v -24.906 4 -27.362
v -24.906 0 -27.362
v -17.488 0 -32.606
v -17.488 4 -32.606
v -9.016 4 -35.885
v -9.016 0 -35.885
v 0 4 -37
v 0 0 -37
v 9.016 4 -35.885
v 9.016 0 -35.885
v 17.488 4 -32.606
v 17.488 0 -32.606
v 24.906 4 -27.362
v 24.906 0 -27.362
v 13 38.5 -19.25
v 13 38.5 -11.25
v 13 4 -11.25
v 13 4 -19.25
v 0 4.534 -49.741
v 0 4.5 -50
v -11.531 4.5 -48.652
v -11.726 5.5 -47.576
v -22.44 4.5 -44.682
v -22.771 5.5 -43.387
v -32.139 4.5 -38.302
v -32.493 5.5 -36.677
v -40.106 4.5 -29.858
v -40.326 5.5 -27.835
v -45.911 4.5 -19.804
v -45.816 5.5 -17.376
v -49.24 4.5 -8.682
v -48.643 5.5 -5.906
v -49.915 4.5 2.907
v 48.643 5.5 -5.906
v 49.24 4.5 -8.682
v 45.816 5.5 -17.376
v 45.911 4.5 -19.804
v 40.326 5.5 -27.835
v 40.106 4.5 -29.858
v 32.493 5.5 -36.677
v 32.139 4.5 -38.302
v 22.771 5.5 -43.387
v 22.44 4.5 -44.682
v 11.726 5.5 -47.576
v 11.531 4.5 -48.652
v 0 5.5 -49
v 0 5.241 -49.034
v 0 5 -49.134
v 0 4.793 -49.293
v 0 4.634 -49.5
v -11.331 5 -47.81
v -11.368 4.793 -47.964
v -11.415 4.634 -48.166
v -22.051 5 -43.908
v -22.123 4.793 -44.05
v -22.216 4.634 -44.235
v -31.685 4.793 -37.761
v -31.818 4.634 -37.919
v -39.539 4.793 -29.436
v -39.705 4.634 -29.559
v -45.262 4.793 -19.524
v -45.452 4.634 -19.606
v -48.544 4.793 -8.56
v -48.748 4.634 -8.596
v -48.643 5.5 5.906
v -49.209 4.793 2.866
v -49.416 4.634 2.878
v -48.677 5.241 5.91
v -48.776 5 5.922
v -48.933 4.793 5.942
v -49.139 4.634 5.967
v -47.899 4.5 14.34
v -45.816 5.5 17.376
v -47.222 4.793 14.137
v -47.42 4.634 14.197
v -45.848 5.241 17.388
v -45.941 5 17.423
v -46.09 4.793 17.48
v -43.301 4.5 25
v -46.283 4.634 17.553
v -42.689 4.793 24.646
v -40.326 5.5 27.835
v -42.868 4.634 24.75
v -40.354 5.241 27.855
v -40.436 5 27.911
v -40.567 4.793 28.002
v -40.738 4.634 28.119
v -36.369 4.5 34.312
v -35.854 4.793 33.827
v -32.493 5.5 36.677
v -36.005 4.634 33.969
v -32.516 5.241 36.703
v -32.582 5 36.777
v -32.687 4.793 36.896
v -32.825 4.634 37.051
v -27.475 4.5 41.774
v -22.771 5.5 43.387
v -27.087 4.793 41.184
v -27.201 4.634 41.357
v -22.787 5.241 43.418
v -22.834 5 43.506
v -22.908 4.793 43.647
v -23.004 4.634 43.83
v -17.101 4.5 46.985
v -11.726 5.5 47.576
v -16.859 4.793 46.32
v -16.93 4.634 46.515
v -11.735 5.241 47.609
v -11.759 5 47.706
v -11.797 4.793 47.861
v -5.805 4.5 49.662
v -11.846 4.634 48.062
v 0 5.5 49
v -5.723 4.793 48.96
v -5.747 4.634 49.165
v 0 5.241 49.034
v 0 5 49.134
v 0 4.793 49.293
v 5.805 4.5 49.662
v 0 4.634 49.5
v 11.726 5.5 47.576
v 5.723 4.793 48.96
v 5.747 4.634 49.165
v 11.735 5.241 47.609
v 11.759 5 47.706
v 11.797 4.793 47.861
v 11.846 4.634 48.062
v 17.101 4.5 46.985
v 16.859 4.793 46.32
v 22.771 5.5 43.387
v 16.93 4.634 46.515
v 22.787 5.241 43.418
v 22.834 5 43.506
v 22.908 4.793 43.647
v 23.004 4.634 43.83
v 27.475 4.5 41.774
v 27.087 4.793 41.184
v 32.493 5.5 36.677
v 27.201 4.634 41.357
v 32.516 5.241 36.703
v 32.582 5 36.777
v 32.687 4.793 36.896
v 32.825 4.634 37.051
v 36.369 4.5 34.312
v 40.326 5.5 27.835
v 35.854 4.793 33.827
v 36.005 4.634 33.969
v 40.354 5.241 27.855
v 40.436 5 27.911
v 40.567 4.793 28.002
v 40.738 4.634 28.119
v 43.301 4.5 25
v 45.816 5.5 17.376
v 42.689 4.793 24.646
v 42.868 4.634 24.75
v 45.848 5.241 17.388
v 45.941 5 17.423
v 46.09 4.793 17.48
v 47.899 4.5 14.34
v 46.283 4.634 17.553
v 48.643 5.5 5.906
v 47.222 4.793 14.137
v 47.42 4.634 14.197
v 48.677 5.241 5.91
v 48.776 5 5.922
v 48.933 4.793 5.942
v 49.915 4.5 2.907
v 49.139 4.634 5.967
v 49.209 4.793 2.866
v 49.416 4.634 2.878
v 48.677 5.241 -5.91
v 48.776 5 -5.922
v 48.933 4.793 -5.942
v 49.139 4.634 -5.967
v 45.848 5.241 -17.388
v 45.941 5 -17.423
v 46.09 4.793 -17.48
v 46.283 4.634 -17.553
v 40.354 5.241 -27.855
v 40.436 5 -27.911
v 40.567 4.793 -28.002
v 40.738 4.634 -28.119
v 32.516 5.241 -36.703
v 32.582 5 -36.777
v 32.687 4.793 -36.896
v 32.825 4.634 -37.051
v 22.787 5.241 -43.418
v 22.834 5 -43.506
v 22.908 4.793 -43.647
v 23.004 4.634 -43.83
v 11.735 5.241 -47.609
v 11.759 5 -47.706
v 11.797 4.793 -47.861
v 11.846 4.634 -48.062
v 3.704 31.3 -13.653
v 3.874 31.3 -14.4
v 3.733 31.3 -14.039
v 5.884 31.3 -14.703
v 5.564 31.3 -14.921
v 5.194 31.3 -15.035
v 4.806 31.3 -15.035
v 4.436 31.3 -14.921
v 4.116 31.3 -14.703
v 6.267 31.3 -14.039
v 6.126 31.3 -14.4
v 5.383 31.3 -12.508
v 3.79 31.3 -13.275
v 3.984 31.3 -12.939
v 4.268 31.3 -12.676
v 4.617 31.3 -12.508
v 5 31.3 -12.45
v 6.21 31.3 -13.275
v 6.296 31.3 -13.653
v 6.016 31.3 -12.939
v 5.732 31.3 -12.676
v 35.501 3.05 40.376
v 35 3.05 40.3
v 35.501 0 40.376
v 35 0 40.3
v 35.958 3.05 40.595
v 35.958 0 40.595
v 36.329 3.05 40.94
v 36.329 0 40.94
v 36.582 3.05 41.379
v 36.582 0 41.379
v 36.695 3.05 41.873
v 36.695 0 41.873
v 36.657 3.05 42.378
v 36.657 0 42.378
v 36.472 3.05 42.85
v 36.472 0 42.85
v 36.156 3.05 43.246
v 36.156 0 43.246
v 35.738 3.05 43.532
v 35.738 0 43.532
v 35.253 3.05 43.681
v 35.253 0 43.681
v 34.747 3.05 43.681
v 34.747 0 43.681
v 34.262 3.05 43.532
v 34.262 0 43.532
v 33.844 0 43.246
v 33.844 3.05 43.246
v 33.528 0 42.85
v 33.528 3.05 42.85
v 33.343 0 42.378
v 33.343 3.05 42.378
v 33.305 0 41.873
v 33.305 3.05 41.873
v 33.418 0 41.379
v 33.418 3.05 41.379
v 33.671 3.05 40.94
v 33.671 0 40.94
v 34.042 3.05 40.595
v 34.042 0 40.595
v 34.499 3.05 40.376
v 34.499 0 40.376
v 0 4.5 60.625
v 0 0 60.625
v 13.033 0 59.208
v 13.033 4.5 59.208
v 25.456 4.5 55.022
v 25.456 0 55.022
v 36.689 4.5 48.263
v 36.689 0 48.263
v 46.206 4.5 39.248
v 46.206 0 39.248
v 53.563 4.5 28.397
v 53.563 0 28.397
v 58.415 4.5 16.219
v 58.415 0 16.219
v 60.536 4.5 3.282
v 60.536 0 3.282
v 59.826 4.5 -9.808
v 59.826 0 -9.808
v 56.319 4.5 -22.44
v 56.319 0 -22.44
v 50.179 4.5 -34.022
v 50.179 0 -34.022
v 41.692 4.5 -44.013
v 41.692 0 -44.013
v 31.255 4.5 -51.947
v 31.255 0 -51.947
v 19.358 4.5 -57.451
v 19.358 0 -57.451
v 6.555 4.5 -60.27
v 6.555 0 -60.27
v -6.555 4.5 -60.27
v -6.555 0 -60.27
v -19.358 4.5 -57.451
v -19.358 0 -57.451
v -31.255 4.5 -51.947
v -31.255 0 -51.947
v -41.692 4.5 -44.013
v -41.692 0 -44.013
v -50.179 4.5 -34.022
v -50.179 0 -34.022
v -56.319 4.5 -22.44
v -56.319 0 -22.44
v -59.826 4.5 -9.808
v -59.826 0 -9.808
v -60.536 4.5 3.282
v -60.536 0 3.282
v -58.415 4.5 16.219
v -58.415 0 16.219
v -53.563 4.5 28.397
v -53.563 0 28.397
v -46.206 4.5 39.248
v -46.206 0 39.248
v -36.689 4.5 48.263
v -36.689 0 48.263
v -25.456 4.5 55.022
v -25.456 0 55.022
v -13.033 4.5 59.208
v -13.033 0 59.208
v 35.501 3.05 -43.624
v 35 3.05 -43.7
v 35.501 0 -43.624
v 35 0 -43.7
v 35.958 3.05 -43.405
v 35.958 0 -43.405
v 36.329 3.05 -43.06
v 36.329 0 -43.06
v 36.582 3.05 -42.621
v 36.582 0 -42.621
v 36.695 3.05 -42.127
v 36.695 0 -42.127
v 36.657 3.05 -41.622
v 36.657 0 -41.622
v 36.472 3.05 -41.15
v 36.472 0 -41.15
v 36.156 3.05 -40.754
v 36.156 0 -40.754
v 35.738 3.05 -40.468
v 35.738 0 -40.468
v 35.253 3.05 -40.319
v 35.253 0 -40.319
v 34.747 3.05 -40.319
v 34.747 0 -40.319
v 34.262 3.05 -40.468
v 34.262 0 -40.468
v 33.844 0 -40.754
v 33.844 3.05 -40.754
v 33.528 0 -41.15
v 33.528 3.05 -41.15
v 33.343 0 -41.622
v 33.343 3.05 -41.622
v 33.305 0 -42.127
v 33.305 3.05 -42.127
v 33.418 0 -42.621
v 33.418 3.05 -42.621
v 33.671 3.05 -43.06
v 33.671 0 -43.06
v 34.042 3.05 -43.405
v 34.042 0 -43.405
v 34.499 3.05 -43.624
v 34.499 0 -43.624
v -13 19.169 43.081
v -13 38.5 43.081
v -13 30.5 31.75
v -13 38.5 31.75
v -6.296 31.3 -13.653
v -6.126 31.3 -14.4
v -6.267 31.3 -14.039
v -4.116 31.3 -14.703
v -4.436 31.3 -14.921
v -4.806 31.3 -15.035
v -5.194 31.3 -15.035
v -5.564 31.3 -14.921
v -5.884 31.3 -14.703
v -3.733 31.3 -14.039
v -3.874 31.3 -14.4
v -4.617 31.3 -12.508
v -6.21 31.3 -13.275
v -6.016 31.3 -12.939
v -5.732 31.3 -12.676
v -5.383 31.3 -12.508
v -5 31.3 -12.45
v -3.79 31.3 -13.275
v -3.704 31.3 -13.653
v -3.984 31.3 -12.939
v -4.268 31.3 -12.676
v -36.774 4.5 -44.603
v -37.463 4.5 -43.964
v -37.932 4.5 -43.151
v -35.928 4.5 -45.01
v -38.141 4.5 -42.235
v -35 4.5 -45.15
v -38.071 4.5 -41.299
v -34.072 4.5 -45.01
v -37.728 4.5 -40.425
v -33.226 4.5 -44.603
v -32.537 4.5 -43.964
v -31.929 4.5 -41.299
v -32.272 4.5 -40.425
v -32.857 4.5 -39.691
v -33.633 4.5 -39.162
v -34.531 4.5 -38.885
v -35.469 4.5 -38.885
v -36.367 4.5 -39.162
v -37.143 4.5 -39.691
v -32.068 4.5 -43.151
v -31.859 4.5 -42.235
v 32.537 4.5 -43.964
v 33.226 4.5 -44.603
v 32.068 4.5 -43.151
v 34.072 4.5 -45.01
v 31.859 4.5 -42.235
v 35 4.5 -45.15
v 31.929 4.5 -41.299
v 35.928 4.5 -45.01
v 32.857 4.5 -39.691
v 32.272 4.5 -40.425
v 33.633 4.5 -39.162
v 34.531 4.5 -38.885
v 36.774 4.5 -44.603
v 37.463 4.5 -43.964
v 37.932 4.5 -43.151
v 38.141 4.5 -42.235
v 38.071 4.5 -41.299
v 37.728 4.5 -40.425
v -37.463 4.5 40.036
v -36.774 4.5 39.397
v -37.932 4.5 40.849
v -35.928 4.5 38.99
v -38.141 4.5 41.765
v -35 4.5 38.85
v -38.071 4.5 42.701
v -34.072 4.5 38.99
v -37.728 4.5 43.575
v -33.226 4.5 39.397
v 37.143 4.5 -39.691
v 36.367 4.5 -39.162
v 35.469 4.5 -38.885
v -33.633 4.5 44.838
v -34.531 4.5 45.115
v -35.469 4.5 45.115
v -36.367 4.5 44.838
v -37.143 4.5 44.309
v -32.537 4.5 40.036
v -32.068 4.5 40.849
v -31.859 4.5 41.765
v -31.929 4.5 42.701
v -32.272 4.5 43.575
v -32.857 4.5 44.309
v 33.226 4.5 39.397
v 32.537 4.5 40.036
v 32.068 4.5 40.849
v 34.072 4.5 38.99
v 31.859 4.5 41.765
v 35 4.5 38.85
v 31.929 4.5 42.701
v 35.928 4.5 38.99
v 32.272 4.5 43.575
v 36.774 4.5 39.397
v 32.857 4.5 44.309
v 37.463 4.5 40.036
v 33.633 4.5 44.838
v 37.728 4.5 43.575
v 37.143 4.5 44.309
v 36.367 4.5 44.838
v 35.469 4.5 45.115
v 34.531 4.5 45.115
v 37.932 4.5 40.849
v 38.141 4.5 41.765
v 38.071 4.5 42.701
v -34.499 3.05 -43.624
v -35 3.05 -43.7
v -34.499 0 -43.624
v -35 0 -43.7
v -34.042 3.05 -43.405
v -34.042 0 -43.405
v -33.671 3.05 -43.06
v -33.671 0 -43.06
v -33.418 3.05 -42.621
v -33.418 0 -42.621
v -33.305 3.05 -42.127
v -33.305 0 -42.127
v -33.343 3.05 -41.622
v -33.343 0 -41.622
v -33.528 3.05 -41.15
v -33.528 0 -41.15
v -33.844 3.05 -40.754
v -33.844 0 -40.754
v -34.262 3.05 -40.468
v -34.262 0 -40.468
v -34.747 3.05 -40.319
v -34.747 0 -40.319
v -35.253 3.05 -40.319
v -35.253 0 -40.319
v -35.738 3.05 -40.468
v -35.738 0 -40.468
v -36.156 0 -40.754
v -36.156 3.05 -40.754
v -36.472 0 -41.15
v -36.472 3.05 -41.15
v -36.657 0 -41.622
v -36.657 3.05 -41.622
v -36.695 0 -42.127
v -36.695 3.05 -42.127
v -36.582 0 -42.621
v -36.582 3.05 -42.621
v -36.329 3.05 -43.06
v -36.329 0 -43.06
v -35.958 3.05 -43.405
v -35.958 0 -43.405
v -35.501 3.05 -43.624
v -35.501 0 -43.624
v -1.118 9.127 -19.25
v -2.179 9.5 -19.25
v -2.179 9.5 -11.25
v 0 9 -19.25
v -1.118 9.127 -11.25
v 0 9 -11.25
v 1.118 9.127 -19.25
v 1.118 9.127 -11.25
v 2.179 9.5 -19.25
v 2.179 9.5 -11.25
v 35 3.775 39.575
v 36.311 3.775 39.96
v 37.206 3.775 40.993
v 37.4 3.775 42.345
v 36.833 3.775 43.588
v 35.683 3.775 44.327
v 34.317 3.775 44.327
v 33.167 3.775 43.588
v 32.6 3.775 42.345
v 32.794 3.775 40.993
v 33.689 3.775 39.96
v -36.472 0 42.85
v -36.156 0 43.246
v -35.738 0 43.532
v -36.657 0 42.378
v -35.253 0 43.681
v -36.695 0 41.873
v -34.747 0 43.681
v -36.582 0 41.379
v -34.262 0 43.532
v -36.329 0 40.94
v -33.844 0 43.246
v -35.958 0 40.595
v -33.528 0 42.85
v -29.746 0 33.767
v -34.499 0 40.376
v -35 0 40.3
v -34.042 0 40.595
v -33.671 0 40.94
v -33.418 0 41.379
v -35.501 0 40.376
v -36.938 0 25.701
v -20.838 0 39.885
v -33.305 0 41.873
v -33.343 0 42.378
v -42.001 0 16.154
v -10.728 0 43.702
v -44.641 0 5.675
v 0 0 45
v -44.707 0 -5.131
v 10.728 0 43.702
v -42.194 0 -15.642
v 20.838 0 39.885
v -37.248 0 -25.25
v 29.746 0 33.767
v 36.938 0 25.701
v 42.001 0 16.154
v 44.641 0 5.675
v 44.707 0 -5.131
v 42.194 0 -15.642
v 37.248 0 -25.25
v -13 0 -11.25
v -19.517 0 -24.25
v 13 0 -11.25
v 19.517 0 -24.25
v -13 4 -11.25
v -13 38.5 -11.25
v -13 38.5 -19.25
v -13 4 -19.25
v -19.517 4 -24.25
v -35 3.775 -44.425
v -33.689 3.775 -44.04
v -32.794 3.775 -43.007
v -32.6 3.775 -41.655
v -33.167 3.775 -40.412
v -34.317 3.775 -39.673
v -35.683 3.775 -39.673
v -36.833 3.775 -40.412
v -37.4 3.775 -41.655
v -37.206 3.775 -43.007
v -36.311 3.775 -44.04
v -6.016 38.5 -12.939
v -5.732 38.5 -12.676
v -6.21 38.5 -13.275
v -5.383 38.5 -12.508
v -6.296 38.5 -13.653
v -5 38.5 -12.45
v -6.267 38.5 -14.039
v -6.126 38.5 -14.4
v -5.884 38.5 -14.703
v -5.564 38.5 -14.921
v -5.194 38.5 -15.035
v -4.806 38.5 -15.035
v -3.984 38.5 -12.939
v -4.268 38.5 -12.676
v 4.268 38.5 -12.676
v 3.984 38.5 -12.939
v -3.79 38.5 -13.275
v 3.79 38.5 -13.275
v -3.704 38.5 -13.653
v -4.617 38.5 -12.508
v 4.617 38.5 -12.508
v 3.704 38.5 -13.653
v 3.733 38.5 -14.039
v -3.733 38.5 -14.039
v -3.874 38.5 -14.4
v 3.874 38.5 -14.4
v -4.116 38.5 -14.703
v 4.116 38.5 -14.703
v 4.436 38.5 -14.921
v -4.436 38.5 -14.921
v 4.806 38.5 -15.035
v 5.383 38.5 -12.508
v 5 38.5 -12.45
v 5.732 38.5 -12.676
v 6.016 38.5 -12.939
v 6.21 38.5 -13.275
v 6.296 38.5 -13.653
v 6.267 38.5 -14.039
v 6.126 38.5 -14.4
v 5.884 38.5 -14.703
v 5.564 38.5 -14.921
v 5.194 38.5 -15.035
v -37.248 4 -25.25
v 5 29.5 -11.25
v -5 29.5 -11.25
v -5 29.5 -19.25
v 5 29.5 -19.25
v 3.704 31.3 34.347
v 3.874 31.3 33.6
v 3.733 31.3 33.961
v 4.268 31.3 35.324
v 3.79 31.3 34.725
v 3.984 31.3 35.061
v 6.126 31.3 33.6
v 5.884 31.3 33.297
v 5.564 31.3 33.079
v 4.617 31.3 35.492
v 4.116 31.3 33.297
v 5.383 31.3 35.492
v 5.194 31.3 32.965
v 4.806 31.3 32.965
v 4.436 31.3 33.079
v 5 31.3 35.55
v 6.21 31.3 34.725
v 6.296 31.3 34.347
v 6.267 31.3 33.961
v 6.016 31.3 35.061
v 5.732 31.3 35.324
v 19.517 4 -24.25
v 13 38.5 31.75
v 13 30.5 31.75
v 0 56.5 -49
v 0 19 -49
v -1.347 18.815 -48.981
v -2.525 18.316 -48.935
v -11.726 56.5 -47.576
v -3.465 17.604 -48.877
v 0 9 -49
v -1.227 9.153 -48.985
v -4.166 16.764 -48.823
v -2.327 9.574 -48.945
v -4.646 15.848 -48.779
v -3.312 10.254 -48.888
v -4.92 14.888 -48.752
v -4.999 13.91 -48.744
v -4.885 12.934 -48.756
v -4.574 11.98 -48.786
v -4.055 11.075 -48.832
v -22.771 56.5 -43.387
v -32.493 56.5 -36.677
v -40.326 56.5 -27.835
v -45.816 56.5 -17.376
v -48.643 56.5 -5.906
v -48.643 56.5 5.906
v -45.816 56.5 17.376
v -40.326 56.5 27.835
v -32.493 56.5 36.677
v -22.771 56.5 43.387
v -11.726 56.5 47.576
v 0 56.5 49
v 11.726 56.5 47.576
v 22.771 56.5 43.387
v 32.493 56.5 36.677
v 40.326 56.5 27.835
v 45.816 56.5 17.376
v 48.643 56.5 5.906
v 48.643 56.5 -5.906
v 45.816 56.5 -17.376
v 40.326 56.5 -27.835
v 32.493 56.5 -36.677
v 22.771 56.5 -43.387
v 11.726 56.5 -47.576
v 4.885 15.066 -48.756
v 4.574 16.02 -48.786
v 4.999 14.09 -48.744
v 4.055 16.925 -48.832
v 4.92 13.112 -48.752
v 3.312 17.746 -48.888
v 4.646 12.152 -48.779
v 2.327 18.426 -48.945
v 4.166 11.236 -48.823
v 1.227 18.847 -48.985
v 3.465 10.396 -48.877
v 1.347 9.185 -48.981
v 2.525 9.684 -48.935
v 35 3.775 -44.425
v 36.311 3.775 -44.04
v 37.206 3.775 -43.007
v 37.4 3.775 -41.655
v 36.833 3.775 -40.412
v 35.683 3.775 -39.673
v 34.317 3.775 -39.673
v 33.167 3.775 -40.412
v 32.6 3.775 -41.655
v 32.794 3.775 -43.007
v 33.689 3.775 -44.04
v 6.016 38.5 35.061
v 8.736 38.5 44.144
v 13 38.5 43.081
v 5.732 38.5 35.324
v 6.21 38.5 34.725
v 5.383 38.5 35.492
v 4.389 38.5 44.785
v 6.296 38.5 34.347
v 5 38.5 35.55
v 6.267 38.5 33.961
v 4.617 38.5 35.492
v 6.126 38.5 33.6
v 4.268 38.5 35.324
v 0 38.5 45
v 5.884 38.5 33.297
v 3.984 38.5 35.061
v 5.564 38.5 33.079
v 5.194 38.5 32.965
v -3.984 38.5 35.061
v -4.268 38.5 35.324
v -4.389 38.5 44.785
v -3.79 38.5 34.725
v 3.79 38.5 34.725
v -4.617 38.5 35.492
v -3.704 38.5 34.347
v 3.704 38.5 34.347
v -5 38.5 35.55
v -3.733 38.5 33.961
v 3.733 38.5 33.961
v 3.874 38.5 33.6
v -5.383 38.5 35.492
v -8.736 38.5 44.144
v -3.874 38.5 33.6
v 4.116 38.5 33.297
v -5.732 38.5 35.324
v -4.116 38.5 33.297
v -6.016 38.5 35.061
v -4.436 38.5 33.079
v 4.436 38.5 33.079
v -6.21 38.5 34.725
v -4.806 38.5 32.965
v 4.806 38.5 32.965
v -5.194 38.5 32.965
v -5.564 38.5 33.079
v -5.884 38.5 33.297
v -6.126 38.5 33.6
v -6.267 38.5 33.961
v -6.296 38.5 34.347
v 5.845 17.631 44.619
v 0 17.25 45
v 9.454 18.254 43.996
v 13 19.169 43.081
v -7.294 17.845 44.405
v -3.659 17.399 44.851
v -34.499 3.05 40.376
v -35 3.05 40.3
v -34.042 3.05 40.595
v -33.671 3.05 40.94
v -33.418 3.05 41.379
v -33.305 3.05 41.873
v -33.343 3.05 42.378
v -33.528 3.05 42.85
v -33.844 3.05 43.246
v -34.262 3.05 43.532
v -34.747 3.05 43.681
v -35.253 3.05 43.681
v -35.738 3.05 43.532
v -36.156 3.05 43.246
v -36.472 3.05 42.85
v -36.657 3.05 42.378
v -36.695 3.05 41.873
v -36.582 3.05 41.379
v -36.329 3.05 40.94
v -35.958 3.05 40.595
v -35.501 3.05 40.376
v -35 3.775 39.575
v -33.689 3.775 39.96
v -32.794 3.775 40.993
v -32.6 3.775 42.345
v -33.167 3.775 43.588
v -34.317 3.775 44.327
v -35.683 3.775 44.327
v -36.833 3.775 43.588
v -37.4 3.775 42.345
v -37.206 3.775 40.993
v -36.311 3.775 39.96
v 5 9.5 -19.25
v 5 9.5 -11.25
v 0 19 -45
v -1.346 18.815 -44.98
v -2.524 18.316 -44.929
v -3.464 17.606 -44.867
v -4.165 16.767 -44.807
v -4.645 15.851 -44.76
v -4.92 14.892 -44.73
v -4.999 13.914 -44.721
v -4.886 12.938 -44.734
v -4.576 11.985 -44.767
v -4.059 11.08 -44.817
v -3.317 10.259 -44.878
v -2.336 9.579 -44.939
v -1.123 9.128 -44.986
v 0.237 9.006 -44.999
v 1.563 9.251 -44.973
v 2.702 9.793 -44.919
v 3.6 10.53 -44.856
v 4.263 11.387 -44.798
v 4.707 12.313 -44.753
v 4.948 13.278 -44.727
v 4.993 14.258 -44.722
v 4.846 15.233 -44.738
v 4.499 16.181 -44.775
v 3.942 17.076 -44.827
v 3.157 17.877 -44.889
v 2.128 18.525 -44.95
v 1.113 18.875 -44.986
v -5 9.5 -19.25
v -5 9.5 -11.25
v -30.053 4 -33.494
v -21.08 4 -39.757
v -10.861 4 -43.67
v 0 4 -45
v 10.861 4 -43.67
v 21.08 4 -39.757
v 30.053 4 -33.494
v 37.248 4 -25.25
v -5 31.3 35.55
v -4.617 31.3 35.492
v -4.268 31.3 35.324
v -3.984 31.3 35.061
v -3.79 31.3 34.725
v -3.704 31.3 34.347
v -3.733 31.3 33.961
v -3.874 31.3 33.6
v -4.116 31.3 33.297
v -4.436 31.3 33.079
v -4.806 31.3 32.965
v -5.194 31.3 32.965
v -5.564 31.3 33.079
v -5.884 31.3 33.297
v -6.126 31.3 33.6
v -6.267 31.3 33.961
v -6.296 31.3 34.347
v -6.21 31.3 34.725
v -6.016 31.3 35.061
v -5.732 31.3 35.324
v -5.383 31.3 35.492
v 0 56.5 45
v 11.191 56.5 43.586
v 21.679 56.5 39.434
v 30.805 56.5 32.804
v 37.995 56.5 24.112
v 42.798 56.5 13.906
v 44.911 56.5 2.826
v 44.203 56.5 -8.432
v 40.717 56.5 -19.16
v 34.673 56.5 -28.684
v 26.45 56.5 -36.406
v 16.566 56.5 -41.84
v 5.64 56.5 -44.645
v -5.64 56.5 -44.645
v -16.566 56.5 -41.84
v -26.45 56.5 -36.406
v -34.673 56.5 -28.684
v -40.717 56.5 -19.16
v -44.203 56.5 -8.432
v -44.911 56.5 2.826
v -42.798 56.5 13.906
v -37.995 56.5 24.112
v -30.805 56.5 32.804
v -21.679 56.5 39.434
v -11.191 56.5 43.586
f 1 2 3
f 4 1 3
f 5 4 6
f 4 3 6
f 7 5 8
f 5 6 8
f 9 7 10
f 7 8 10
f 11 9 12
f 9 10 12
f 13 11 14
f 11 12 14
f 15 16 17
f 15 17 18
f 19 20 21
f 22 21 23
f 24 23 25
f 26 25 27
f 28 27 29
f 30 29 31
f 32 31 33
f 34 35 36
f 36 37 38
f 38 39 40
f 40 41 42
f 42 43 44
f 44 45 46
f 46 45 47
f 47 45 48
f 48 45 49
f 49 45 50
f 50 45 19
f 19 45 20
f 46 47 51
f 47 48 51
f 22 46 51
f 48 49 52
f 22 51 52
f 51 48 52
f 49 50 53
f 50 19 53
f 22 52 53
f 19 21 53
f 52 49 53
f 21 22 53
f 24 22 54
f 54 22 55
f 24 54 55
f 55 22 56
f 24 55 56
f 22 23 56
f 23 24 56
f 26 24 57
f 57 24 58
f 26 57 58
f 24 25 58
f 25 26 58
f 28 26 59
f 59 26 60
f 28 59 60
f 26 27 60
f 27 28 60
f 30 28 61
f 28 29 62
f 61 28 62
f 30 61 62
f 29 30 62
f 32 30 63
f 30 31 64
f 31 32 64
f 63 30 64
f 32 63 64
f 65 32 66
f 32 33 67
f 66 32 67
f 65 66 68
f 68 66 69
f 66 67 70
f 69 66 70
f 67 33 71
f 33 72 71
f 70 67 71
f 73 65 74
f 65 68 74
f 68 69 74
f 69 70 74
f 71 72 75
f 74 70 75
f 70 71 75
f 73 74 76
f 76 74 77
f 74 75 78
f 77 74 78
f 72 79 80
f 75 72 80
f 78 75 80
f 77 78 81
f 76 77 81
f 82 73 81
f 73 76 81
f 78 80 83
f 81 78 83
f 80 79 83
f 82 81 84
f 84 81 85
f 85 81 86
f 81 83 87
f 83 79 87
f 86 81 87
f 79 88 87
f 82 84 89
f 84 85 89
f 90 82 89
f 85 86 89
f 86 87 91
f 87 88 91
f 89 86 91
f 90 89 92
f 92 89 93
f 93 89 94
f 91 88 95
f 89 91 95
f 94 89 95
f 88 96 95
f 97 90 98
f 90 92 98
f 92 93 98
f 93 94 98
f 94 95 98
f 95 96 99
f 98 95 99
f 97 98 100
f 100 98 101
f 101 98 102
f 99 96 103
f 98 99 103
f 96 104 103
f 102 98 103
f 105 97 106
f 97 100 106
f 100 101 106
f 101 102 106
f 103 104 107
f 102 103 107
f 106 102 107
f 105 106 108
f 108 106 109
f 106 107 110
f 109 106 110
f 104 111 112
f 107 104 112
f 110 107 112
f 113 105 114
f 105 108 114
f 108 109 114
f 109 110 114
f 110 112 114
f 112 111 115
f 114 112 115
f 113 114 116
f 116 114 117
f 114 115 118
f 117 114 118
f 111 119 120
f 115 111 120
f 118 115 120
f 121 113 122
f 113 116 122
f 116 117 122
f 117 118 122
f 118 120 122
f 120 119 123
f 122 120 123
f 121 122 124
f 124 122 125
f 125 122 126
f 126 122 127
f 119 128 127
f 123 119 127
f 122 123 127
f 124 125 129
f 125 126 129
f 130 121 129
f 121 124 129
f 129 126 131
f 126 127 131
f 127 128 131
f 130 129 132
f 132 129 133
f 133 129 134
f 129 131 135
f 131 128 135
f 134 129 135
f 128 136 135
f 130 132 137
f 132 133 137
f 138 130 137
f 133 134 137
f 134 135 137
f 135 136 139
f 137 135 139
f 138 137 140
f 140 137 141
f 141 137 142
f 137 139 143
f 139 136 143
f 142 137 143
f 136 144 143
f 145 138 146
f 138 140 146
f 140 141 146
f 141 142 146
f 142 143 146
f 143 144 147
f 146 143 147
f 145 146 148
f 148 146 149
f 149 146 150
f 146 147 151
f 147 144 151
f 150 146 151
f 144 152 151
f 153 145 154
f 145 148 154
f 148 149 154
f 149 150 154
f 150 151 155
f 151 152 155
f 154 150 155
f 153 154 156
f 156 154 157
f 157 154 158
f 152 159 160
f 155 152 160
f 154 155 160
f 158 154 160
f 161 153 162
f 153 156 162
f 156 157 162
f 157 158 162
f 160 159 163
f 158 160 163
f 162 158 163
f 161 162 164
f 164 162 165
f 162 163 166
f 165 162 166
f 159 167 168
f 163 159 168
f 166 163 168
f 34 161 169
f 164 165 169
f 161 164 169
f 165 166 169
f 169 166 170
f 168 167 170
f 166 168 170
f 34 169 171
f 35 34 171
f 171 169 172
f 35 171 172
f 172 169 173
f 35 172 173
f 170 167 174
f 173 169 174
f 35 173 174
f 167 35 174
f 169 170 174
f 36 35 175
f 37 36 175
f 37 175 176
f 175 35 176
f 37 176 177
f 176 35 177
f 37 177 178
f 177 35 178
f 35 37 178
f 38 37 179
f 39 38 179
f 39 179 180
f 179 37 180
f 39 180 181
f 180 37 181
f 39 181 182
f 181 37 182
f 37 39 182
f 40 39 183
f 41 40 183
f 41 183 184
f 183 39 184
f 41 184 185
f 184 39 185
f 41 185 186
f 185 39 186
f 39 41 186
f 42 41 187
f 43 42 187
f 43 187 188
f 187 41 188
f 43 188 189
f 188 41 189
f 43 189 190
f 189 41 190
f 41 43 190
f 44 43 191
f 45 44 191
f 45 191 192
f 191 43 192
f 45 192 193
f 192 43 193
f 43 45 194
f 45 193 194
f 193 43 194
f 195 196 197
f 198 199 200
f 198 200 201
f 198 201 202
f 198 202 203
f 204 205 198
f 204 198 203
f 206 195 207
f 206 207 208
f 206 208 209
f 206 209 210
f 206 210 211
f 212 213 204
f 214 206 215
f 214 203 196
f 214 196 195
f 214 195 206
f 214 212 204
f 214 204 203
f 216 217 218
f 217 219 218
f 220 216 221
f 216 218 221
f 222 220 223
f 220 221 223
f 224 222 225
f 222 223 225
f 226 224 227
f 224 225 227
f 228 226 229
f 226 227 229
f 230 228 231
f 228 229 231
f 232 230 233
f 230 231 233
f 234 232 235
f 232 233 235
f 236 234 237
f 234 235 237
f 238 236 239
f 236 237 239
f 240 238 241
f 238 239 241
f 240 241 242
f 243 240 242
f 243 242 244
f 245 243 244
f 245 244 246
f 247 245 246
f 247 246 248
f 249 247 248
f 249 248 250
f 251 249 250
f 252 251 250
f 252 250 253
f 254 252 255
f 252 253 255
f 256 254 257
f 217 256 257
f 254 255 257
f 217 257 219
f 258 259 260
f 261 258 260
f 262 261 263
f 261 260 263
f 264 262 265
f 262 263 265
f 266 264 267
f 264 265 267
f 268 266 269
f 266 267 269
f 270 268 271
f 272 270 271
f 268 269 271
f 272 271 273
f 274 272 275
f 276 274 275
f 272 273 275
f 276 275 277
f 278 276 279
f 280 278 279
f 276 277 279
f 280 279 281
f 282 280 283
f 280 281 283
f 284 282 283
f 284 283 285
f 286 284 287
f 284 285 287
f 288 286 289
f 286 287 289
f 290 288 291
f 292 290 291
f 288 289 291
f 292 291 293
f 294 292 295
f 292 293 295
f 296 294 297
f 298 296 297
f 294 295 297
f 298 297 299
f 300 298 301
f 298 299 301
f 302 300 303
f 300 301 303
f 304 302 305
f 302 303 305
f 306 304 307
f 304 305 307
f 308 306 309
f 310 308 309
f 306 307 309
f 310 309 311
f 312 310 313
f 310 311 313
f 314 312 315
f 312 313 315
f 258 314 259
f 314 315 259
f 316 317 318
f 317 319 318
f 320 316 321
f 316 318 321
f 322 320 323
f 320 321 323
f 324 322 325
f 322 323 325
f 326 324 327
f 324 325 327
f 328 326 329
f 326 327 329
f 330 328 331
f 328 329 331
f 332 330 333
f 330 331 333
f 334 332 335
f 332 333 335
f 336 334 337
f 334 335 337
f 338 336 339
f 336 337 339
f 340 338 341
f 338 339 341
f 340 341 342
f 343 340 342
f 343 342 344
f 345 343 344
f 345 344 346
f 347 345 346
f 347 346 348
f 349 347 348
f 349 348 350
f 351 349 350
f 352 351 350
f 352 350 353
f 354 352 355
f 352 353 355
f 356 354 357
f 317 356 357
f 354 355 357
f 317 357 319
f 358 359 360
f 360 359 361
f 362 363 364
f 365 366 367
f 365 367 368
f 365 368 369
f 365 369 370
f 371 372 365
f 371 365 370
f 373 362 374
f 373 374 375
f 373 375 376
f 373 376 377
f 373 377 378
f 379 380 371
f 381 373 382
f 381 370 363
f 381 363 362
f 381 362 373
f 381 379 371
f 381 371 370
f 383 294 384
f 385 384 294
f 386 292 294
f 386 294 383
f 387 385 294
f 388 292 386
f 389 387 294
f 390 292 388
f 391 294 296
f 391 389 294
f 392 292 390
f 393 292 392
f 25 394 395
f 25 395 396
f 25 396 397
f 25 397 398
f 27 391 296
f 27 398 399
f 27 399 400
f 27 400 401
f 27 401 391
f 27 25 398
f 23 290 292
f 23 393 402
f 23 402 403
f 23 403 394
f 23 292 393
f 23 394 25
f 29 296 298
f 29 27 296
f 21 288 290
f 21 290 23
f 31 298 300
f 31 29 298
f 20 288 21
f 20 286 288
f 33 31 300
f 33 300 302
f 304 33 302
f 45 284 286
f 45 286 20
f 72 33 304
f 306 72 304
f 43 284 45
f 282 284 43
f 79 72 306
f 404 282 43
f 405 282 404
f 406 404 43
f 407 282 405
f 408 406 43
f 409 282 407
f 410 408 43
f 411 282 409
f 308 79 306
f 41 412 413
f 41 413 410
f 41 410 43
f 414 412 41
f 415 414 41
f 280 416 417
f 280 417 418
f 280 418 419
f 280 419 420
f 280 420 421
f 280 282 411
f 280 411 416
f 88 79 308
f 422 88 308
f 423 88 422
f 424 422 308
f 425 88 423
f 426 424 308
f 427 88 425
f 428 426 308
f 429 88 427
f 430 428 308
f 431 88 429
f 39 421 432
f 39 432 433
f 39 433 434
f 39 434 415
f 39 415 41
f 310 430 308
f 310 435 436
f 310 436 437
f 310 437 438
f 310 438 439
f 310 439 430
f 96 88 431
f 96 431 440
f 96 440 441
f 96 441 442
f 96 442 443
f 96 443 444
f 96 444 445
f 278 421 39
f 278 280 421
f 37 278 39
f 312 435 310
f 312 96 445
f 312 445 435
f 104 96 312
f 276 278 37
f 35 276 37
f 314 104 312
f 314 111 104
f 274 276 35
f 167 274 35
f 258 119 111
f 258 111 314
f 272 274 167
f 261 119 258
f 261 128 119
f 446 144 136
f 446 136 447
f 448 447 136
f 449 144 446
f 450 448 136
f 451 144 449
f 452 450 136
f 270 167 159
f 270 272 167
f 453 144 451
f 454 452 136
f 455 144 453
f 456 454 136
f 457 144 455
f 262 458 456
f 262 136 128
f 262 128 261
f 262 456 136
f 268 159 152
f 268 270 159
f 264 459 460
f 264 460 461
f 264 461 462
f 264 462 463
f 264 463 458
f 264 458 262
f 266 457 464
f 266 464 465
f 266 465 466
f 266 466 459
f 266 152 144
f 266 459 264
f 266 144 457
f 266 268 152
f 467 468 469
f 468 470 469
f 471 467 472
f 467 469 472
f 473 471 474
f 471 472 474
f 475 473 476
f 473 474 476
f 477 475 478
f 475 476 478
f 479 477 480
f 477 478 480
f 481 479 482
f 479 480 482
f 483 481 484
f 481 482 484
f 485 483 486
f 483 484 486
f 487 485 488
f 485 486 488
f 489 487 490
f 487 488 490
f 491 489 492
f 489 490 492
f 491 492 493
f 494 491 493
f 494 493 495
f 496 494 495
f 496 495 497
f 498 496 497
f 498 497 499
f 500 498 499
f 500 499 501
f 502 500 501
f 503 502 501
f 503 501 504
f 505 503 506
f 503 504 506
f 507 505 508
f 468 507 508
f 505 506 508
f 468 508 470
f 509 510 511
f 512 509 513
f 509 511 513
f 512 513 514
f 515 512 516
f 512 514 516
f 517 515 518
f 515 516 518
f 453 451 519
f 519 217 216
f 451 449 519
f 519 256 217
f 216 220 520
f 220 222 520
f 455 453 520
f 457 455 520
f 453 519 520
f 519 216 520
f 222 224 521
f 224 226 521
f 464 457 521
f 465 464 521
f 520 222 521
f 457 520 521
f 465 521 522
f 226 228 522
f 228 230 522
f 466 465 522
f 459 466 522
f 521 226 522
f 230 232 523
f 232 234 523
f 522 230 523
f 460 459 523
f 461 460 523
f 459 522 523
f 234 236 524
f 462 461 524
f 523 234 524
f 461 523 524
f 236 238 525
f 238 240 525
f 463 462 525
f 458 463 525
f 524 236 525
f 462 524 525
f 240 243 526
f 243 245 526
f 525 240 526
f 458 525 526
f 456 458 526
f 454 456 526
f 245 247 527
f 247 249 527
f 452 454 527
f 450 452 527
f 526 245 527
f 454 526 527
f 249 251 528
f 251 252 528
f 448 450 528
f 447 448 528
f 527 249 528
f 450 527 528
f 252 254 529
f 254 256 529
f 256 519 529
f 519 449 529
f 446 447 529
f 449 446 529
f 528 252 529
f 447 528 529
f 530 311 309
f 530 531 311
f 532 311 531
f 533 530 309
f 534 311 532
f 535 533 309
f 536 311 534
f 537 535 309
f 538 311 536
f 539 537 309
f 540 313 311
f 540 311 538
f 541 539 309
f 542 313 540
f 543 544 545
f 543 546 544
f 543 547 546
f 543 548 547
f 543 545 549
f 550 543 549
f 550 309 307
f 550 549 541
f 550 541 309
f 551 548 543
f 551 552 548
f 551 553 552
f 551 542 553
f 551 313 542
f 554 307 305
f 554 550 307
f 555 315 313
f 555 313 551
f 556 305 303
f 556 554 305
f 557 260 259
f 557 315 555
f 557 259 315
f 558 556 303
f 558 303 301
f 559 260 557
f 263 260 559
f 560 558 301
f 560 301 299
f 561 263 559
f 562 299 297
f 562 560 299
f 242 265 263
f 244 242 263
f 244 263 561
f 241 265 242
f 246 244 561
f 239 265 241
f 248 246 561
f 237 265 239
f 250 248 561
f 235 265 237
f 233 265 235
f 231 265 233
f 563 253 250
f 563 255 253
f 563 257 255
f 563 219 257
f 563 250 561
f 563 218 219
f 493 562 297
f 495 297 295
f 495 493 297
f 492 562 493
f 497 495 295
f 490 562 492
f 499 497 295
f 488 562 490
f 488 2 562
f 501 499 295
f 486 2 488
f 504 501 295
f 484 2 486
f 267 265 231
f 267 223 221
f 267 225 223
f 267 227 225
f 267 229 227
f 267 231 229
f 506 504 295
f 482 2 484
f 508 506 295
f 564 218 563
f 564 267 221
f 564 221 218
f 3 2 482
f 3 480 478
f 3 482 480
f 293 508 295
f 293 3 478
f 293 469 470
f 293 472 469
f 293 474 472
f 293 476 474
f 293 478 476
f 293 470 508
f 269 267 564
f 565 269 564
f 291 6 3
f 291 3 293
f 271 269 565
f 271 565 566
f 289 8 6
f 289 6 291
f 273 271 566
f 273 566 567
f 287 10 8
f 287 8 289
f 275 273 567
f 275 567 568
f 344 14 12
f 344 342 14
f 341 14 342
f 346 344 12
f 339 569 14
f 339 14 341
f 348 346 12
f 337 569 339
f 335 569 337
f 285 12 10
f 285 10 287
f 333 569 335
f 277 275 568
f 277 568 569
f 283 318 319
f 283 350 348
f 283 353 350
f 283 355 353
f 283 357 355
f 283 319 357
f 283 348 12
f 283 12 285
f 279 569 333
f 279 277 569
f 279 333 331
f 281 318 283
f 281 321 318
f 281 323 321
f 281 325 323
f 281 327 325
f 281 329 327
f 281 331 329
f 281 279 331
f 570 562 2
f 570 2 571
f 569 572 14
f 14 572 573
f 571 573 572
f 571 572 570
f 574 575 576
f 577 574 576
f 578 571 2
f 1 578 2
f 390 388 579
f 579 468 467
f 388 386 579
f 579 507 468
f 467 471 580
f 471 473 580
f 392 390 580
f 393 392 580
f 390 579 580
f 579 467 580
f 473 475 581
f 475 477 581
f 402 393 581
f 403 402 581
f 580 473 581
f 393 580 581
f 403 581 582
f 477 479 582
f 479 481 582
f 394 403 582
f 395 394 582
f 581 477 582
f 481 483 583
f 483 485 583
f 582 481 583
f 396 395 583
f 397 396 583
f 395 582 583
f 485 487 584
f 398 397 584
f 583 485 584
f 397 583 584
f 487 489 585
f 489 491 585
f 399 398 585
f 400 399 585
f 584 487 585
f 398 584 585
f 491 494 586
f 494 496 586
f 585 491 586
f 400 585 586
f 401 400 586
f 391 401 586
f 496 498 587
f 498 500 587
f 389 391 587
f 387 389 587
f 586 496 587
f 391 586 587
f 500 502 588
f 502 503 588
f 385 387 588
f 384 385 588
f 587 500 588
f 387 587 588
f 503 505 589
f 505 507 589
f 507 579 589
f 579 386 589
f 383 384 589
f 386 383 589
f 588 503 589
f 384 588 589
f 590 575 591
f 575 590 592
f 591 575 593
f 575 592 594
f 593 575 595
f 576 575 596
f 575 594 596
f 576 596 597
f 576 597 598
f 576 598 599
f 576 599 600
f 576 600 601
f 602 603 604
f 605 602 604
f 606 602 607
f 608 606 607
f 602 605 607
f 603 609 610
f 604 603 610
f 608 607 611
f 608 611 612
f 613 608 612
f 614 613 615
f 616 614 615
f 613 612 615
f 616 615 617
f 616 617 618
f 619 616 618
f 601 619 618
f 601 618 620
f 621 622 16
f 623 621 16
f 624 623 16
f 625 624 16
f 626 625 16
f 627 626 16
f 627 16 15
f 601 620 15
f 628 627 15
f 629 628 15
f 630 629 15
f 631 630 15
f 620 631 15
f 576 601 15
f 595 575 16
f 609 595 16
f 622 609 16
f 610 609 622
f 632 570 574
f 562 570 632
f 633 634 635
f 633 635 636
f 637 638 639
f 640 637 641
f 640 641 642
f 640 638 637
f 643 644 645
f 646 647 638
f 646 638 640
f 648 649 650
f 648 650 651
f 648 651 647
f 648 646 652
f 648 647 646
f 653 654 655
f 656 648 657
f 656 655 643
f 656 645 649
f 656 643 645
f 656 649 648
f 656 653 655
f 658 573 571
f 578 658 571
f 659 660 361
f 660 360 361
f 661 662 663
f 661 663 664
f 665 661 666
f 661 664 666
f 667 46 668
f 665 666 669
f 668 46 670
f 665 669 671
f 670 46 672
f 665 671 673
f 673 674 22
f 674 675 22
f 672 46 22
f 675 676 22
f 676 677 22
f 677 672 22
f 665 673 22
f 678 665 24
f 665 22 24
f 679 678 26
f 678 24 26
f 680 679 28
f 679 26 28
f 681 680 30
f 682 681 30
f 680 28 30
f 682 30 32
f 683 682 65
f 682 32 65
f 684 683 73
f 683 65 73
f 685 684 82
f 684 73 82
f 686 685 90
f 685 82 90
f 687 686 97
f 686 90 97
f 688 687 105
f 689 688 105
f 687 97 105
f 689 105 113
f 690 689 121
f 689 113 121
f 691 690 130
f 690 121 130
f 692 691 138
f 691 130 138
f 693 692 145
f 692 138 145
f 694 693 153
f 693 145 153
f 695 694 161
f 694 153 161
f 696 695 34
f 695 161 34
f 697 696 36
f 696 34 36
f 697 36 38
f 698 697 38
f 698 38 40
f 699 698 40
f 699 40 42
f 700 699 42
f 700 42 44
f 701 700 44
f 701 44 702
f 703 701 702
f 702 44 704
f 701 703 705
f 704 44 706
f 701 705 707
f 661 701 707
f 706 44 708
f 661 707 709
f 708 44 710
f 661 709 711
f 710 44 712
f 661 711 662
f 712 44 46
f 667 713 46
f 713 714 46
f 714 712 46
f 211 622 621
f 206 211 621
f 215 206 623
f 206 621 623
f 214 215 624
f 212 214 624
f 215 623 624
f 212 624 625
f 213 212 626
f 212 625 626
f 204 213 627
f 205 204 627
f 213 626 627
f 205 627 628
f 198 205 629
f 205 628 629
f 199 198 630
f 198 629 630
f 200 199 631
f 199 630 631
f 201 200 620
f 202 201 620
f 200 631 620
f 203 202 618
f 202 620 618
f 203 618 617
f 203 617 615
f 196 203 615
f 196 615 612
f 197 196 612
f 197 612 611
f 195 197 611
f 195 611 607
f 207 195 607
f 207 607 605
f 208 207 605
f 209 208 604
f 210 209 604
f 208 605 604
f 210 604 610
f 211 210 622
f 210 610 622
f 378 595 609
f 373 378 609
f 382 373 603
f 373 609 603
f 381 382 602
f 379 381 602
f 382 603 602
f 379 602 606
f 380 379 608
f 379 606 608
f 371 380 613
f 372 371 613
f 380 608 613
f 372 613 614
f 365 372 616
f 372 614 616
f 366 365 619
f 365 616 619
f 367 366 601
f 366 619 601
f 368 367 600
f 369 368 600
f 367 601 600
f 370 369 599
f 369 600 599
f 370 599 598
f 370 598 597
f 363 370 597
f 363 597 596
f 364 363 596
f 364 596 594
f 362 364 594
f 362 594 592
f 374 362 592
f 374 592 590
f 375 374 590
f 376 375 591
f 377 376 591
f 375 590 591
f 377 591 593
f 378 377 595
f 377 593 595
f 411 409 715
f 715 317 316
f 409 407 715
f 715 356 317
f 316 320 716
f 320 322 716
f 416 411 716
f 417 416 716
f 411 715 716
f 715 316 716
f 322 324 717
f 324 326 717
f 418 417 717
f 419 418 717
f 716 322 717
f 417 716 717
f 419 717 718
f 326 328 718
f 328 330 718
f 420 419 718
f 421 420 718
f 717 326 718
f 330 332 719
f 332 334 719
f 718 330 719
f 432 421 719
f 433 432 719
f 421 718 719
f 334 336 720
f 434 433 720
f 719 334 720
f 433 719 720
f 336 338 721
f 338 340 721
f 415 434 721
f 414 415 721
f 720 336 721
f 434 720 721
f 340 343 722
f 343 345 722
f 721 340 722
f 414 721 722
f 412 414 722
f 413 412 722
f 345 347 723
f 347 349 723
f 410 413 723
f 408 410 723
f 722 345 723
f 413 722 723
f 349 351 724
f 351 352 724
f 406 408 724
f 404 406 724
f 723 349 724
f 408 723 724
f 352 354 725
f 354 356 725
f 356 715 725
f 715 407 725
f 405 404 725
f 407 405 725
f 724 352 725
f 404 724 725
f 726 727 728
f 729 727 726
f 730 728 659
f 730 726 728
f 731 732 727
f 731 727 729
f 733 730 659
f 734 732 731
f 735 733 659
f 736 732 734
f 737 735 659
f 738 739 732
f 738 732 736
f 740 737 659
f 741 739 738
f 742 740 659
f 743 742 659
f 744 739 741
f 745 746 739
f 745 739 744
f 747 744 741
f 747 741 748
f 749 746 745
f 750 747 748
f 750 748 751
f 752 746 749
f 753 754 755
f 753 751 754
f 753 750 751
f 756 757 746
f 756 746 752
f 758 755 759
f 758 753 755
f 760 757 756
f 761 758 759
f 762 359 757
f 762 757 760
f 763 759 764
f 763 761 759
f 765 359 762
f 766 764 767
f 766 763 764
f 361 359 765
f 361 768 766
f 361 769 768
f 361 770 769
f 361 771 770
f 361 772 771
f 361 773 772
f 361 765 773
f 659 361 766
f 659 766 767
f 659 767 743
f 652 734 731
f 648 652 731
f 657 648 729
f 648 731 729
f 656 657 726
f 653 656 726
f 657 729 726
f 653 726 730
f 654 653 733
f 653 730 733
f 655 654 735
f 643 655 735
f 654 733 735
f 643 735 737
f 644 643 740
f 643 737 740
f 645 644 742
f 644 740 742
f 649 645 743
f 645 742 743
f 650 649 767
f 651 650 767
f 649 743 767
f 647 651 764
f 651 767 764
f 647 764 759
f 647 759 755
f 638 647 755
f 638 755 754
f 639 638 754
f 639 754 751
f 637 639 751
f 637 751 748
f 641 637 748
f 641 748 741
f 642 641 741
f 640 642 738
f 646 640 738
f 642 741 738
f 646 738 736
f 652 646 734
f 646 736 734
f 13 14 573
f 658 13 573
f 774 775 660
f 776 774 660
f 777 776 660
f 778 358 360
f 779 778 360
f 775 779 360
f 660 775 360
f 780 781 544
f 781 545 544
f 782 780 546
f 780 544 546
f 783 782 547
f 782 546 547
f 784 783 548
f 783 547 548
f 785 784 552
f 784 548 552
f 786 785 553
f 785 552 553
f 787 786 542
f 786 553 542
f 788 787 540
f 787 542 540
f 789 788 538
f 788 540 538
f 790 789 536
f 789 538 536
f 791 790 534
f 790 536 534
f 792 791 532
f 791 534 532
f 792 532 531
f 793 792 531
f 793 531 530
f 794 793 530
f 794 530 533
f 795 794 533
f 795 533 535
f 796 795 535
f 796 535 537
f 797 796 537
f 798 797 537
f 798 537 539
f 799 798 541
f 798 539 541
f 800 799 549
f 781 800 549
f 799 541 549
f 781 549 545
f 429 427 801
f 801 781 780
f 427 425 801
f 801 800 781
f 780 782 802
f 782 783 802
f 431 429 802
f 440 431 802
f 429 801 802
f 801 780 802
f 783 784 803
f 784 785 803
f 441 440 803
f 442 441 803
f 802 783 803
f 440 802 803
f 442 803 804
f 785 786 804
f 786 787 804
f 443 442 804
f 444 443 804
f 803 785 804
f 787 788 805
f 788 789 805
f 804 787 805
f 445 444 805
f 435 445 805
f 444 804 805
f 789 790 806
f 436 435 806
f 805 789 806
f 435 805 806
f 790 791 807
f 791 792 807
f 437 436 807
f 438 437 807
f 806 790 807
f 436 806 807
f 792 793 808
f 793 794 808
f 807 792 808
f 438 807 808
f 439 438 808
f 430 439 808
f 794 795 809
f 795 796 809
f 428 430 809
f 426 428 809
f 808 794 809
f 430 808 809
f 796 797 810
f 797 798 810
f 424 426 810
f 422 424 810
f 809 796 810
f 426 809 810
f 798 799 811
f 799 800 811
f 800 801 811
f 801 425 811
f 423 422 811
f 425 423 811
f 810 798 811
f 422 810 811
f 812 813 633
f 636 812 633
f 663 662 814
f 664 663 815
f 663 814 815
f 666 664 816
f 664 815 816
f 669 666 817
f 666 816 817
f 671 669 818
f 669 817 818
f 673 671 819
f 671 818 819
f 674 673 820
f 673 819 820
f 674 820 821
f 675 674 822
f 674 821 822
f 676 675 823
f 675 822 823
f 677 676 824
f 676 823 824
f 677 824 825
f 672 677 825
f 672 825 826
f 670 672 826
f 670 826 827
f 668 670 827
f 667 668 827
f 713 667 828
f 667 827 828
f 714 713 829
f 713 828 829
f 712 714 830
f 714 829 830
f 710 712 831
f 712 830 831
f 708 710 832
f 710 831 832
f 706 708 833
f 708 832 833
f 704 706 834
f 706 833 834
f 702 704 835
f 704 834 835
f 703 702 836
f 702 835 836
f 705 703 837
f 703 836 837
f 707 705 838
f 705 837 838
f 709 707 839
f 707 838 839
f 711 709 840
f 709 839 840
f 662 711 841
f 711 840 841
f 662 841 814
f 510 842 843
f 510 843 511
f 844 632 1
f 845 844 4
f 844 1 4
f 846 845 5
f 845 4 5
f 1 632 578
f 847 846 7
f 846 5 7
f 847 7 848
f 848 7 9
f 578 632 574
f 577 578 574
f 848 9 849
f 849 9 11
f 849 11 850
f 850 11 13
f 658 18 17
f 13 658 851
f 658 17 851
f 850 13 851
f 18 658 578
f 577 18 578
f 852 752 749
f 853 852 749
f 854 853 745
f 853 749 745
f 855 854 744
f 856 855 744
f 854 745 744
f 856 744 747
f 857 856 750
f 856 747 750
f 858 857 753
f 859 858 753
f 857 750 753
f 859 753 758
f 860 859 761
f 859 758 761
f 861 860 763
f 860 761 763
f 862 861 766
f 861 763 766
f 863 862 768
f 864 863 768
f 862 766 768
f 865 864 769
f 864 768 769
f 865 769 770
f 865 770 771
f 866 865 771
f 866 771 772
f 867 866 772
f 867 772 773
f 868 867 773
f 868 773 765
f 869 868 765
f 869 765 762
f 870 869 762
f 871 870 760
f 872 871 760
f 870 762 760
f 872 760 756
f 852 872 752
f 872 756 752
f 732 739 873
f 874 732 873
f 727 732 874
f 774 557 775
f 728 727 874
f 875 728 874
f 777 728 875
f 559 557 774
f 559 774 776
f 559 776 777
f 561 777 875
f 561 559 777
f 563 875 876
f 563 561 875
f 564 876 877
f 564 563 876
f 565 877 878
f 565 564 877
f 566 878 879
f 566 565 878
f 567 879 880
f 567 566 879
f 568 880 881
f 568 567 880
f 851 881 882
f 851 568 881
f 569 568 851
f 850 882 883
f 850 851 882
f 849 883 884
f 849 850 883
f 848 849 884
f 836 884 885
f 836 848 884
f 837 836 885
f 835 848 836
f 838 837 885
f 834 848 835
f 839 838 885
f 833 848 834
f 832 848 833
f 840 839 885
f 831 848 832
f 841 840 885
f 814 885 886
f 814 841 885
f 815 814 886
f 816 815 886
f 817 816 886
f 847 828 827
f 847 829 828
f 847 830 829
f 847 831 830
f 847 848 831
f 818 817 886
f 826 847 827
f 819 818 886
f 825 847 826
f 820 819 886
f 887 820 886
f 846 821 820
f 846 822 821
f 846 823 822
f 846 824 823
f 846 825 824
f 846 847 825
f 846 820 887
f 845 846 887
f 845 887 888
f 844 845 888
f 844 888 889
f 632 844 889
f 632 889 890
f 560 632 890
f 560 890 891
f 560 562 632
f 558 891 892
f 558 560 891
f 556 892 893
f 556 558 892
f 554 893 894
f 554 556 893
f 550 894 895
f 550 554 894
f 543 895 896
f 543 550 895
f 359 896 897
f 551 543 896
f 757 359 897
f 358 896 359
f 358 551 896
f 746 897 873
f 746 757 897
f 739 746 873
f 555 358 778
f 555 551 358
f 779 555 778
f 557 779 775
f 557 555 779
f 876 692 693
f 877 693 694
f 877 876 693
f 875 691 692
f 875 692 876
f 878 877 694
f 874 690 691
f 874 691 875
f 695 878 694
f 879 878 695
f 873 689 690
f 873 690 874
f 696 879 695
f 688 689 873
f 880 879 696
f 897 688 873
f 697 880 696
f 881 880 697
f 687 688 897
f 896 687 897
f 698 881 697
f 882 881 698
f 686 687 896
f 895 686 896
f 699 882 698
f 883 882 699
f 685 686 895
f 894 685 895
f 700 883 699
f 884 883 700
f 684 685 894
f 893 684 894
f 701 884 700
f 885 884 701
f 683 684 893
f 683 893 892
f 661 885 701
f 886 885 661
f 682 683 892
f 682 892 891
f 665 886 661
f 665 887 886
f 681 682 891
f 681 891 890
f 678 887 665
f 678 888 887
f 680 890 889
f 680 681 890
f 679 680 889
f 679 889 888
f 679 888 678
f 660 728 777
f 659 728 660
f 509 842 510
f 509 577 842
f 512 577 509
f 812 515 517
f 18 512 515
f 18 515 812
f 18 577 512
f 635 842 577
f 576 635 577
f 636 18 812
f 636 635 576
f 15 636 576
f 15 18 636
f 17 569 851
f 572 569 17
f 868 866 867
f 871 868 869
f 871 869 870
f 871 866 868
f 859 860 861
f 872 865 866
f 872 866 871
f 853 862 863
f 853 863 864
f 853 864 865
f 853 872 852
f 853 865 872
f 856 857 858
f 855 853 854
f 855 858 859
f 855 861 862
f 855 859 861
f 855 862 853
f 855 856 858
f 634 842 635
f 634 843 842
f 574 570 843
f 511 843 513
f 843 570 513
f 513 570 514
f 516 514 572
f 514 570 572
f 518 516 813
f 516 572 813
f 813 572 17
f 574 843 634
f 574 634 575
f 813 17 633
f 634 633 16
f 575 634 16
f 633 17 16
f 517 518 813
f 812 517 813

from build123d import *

# Parameters (mm, degrees)
SKETCH2_R                                           = 60.625
SKETCH2_R_2                                         = 45
BOSS_EXTRUDE1_DEPTH                                 = 4.5
SKETCH3_R                                           = 49
SKETCH3_R_2                                         = 45
BOSS_EXTRUDE2_DEPTH                                 = 52
SKETCH4_W                                           = 13.25
SKETCH4_H                                           = 8
SKETCH4_W_2                                         = 8
SKETCH4_H_2                                         = 38.5
BOSS_EXTRUDE3_DEPTH                                 = 13
SKETCH5_W                                           = 10
SKETCH5_H                                           = 20
CUT_EXTRUDE1_DEPTH                                  = 26
SKETCH6_R                                           = 5
CUT_EXTRUDE2_DEPTH                                  = 110.698023
SKETCH7_R                                           = 1.3
CUT_EXTRUDE3_DEPTH                                  = 7.2
BOSS_EXTRUDE4_DEPTH                                 = 4
CSK_FOR_M3_COUNTERSUNK_FLAT_HEAD_SCREW1_D           = 3.4
CSK_FOR_M3_COUNTERSUNK_FLAT_HEAD_SCREW1_DEPTH       = 44.45
CSK_FOR_M3_COUNTERSUNK_FLAT_HEAD_SCREW1_CSINK_D     = 6.3
CSK_FOR_M3_COUNTERSUNK_FLAT_HEAD_SCREW1_CSINK_ANGLE = 90
CSK_FOR_M3_COUNTERSUNK_FLAT_HEAD_SCREW1_TIP         = 1.021463052
FILLET1_R                                           = 1


with BuildPart() as part:
    # Sketch2 → Boss-Extrude1 (new body)
    with BuildSketch(Plane(origin=(0, 0, 0), x_dir=(1, 0, 0), z_dir=(0, 1, 0))):
        with Locations(Location((0, 0, 0), (0, 0, 270))):
            Circle(SKETCH2_R)
        with Locations(Location((0, 0, 0), (0, 0, 270))):
            Circle(SKETCH2_R_2, mode=Mode.SUBTRACT)
    extrude(amount=BOSS_EXTRUDE1_DEPTH)

    # Sketch3 → Boss-Extrude2 (add)
    with BuildSketch(Plane(origin=(0, 4.5, 0), x_dir=(1, 0, 0), z_dir=(0, 1, 0))):
        with Locations(Location((0, 0, 0), (0, 0, 90))):
            Circle(SKETCH3_R)
        with Locations(Location((0, 0, 0), (0, 0, 270))):
            Circle(SKETCH3_R_2, mode=Mode.SUBTRACT)
    extrude(amount=BOSS_EXTRUDE2_DEPTH)

    # Sketch4 → Boss-Extrude3 (add, symmetric)
    with BuildSketch(Plane(origin=(0, 0, 0), x_dir=(0, 0, -1), z_dir=(1, 0, 0))):
        Polygon((-31.75, 30.5), (-45, 30.5), (-45, 17.25), align=None)
        with Locations((-38.375, 34.5)):
            Rectangle(SKETCH4_W, SKETCH4_H)
        with Locations((15.25, 19.25)):
            Rectangle(SKETCH4_W_2, SKETCH4_H_2)
    extrude(amount=BOSS_EXTRUDE3_DEPTH, both=True)


with BuildPart() as boss_extrude3_piece_1:
    # of the separate pieces the step leaves, piece 1, a body of its own (boss_extrude3_pieces)
    add(part.part.solids().sort_by_distance((0, 0, 60.625))[0])


with BuildPart() as boss_extrude3_piece_2:
    # of the separate pieces the step leaves, piece 2, a body of its own (boss_extrude3_pieces)
    add(part.part.solids().sort_by_distance((-13, 38.5, -19.25))[0])

    # Sketch5 → Cut-Extrude1 (cut)
    with BuildSketch(Plane.XY):
        with Locations((0, 19.5)):
            Rectangle(SKETCH5_W, SKETCH5_H)
    extrude(amount=-CUT_EXTRUDE1_DEPTH, mode=Mode.SUBTRACT)


with BuildPart() as cut_extrude2_tool:
    # Sketch6 → Cut-Extrude2 (new, through all)
    with BuildSketch(Plane.XY.offset(-11.25)):
        with Locations(Location((0, 14, 0), (0, 0, 90))):
            Circle(SKETCH6_R)
    extrude(amount=-CUT_EXTRUDE2_DEPTH)


with BuildPart() as boss_extrude3_piece_1_1:
    add(boss_extrude3_piece_1.part)

    # Cut-Extrude2: cut by cut_extrude2_tool
    add(cut_extrude2_tool.part, mode=Mode.SUBTRACT)


with BuildPart() as boss_extrude3_piece_2_1:
    add(boss_extrude3_piece_2.part)

    # Cut-Extrude2: cut by cut_extrude2_tool
    add(cut_extrude2_tool.part, mode=Mode.SUBTRACT)


with BuildPart() as cut_extrude3_tool:
    # Sketch7 → Cut-Extrude3 (new body)
    with BuildSketch(Plane(origin=(0, 38.5, 0), x_dir=(1, 0, 0), z_dir=(0, 1, 0))):
        with Locations(Location((-5, 13.75, 0), (0, 0, 270))):
            Circle(SKETCH7_R)
        with Locations(Location((5, 13.75, 0), (0, 0, 270))):
            Circle(SKETCH7_R)
        with Locations(Location((-5, -34.25, 0), (0, 0, 270))):
            Circle(SKETCH7_R)
        with Locations(Location((5, -34.25, 0), (0, 0, 270))):
            Circle(SKETCH7_R)
    extrude(amount=-CUT_EXTRUDE3_DEPTH)


with BuildPart() as boss_extrude3_piece_1_2:
    add(boss_extrude3_piece_1_1.part)

    # Cut-Extrude3: cut by cut_extrude3_tool
    add(cut_extrude3_tool.part, mode=Mode.SUBTRACT)



with BuildPart() as boss_extrude3_piece_2_2:
    add(boss_extrude3_piece_2_1.part)

    # Cut-Extrude3: cut by cut_extrude3_tool
    add(cut_extrude3_tool.part, mode=Mode.SUBTRACT)


with BuildPart() as boss_extrude3_piece_1_3:
    add(boss_extrude3_piece_1_2.part)

    add(boss_extrude3_piece_2_2.part)  # Boss-Extrude4 merges Boss-Extrude3 piece 2
    # Sketch8 → Boss-Extrude4 (add)
    with BuildSketch(Plane.XZ):
        with BuildLine():
            Line((13, -11.25), (-13, -11.25))
            Line((-13, -11.25), (-37.248431585, -25.249838503))
            ThreePointArc((-37.248431585, -25.249838503), (0, -45), (37.248431585, -25.249838503))
            Line((37.248431585, -25.249838503), (13, -11.25))
        make_face()
        with BuildLine():
            Line((-19.516660498, -24.25), (-24.906460381, -27.361802413))
            ThreePointArc((-24.906460381, -27.361802413), (0, -37), (24.906460381, -27.361802413))
            Line((24.906460381, -27.361802413), (19.516660498, -24.25))
            Line((19.516660498, -24.25), (-19.516660498, -24.25))
        make_face(mode=Mode.SUBTRACT)
    extrude(amount=-BOSS_EXTRUDE4_DEPTH)

    # CSK for M3 Countersunk Flat Head Screw1
    with Locations(Plane(origin=(-35, 4.5, -42), x_dir=(0, 0, 1), z_dir=(0, 1, 0))):
        with Locations((0, 0), (0, 70), (84, 70), (84, 0)):
            CounterSinkHole(CSK_FOR_M3_COUNTERSUNK_FLAT_HEAD_SCREW1_D / 2, CSK_FOR_M3_COUNTERSUNK_FLAT_HEAD_SCREW1_CSINK_D / 2, depth=CSK_FOR_M3_COUNTERSUNK_FLAT_HEAD_SCREW1_DEPTH, counter_sink_angle=CSK_FOR_M3_COUNTERSUNK_FLAT_HEAD_SCREW1_CSINK_ANGLE)
            with Locations((0, 0, -(CSK_FOR_M3_COUNTERSUNK_FLAT_HEAD_SCREW1_DEPTH + CSK_FOR_M3_COUNTERSUNK_FLAT_HEAD_SCREW1_TIP / 2))):  # 118° drill point
                Cone(0, CSK_FOR_M3_COUNTERSUNK_FLAT_HEAD_SCREW1_D / 2, CSK_FOR_M3_COUNTERSUNK_FLAT_HEAD_SCREW1_TIP, mode=Mode.SUBTRACT)

    # Fillet1
    fillet1_edges = [boss_extrude3_piece_1_3.edges().sort_by_distance(p)[0] for p in [
        (0, 4.5, 49),
    ]]
    fillet(fillet1_edges, radius=FILLET1_R)


solid = boss_extrude3_piece_1_3.part
